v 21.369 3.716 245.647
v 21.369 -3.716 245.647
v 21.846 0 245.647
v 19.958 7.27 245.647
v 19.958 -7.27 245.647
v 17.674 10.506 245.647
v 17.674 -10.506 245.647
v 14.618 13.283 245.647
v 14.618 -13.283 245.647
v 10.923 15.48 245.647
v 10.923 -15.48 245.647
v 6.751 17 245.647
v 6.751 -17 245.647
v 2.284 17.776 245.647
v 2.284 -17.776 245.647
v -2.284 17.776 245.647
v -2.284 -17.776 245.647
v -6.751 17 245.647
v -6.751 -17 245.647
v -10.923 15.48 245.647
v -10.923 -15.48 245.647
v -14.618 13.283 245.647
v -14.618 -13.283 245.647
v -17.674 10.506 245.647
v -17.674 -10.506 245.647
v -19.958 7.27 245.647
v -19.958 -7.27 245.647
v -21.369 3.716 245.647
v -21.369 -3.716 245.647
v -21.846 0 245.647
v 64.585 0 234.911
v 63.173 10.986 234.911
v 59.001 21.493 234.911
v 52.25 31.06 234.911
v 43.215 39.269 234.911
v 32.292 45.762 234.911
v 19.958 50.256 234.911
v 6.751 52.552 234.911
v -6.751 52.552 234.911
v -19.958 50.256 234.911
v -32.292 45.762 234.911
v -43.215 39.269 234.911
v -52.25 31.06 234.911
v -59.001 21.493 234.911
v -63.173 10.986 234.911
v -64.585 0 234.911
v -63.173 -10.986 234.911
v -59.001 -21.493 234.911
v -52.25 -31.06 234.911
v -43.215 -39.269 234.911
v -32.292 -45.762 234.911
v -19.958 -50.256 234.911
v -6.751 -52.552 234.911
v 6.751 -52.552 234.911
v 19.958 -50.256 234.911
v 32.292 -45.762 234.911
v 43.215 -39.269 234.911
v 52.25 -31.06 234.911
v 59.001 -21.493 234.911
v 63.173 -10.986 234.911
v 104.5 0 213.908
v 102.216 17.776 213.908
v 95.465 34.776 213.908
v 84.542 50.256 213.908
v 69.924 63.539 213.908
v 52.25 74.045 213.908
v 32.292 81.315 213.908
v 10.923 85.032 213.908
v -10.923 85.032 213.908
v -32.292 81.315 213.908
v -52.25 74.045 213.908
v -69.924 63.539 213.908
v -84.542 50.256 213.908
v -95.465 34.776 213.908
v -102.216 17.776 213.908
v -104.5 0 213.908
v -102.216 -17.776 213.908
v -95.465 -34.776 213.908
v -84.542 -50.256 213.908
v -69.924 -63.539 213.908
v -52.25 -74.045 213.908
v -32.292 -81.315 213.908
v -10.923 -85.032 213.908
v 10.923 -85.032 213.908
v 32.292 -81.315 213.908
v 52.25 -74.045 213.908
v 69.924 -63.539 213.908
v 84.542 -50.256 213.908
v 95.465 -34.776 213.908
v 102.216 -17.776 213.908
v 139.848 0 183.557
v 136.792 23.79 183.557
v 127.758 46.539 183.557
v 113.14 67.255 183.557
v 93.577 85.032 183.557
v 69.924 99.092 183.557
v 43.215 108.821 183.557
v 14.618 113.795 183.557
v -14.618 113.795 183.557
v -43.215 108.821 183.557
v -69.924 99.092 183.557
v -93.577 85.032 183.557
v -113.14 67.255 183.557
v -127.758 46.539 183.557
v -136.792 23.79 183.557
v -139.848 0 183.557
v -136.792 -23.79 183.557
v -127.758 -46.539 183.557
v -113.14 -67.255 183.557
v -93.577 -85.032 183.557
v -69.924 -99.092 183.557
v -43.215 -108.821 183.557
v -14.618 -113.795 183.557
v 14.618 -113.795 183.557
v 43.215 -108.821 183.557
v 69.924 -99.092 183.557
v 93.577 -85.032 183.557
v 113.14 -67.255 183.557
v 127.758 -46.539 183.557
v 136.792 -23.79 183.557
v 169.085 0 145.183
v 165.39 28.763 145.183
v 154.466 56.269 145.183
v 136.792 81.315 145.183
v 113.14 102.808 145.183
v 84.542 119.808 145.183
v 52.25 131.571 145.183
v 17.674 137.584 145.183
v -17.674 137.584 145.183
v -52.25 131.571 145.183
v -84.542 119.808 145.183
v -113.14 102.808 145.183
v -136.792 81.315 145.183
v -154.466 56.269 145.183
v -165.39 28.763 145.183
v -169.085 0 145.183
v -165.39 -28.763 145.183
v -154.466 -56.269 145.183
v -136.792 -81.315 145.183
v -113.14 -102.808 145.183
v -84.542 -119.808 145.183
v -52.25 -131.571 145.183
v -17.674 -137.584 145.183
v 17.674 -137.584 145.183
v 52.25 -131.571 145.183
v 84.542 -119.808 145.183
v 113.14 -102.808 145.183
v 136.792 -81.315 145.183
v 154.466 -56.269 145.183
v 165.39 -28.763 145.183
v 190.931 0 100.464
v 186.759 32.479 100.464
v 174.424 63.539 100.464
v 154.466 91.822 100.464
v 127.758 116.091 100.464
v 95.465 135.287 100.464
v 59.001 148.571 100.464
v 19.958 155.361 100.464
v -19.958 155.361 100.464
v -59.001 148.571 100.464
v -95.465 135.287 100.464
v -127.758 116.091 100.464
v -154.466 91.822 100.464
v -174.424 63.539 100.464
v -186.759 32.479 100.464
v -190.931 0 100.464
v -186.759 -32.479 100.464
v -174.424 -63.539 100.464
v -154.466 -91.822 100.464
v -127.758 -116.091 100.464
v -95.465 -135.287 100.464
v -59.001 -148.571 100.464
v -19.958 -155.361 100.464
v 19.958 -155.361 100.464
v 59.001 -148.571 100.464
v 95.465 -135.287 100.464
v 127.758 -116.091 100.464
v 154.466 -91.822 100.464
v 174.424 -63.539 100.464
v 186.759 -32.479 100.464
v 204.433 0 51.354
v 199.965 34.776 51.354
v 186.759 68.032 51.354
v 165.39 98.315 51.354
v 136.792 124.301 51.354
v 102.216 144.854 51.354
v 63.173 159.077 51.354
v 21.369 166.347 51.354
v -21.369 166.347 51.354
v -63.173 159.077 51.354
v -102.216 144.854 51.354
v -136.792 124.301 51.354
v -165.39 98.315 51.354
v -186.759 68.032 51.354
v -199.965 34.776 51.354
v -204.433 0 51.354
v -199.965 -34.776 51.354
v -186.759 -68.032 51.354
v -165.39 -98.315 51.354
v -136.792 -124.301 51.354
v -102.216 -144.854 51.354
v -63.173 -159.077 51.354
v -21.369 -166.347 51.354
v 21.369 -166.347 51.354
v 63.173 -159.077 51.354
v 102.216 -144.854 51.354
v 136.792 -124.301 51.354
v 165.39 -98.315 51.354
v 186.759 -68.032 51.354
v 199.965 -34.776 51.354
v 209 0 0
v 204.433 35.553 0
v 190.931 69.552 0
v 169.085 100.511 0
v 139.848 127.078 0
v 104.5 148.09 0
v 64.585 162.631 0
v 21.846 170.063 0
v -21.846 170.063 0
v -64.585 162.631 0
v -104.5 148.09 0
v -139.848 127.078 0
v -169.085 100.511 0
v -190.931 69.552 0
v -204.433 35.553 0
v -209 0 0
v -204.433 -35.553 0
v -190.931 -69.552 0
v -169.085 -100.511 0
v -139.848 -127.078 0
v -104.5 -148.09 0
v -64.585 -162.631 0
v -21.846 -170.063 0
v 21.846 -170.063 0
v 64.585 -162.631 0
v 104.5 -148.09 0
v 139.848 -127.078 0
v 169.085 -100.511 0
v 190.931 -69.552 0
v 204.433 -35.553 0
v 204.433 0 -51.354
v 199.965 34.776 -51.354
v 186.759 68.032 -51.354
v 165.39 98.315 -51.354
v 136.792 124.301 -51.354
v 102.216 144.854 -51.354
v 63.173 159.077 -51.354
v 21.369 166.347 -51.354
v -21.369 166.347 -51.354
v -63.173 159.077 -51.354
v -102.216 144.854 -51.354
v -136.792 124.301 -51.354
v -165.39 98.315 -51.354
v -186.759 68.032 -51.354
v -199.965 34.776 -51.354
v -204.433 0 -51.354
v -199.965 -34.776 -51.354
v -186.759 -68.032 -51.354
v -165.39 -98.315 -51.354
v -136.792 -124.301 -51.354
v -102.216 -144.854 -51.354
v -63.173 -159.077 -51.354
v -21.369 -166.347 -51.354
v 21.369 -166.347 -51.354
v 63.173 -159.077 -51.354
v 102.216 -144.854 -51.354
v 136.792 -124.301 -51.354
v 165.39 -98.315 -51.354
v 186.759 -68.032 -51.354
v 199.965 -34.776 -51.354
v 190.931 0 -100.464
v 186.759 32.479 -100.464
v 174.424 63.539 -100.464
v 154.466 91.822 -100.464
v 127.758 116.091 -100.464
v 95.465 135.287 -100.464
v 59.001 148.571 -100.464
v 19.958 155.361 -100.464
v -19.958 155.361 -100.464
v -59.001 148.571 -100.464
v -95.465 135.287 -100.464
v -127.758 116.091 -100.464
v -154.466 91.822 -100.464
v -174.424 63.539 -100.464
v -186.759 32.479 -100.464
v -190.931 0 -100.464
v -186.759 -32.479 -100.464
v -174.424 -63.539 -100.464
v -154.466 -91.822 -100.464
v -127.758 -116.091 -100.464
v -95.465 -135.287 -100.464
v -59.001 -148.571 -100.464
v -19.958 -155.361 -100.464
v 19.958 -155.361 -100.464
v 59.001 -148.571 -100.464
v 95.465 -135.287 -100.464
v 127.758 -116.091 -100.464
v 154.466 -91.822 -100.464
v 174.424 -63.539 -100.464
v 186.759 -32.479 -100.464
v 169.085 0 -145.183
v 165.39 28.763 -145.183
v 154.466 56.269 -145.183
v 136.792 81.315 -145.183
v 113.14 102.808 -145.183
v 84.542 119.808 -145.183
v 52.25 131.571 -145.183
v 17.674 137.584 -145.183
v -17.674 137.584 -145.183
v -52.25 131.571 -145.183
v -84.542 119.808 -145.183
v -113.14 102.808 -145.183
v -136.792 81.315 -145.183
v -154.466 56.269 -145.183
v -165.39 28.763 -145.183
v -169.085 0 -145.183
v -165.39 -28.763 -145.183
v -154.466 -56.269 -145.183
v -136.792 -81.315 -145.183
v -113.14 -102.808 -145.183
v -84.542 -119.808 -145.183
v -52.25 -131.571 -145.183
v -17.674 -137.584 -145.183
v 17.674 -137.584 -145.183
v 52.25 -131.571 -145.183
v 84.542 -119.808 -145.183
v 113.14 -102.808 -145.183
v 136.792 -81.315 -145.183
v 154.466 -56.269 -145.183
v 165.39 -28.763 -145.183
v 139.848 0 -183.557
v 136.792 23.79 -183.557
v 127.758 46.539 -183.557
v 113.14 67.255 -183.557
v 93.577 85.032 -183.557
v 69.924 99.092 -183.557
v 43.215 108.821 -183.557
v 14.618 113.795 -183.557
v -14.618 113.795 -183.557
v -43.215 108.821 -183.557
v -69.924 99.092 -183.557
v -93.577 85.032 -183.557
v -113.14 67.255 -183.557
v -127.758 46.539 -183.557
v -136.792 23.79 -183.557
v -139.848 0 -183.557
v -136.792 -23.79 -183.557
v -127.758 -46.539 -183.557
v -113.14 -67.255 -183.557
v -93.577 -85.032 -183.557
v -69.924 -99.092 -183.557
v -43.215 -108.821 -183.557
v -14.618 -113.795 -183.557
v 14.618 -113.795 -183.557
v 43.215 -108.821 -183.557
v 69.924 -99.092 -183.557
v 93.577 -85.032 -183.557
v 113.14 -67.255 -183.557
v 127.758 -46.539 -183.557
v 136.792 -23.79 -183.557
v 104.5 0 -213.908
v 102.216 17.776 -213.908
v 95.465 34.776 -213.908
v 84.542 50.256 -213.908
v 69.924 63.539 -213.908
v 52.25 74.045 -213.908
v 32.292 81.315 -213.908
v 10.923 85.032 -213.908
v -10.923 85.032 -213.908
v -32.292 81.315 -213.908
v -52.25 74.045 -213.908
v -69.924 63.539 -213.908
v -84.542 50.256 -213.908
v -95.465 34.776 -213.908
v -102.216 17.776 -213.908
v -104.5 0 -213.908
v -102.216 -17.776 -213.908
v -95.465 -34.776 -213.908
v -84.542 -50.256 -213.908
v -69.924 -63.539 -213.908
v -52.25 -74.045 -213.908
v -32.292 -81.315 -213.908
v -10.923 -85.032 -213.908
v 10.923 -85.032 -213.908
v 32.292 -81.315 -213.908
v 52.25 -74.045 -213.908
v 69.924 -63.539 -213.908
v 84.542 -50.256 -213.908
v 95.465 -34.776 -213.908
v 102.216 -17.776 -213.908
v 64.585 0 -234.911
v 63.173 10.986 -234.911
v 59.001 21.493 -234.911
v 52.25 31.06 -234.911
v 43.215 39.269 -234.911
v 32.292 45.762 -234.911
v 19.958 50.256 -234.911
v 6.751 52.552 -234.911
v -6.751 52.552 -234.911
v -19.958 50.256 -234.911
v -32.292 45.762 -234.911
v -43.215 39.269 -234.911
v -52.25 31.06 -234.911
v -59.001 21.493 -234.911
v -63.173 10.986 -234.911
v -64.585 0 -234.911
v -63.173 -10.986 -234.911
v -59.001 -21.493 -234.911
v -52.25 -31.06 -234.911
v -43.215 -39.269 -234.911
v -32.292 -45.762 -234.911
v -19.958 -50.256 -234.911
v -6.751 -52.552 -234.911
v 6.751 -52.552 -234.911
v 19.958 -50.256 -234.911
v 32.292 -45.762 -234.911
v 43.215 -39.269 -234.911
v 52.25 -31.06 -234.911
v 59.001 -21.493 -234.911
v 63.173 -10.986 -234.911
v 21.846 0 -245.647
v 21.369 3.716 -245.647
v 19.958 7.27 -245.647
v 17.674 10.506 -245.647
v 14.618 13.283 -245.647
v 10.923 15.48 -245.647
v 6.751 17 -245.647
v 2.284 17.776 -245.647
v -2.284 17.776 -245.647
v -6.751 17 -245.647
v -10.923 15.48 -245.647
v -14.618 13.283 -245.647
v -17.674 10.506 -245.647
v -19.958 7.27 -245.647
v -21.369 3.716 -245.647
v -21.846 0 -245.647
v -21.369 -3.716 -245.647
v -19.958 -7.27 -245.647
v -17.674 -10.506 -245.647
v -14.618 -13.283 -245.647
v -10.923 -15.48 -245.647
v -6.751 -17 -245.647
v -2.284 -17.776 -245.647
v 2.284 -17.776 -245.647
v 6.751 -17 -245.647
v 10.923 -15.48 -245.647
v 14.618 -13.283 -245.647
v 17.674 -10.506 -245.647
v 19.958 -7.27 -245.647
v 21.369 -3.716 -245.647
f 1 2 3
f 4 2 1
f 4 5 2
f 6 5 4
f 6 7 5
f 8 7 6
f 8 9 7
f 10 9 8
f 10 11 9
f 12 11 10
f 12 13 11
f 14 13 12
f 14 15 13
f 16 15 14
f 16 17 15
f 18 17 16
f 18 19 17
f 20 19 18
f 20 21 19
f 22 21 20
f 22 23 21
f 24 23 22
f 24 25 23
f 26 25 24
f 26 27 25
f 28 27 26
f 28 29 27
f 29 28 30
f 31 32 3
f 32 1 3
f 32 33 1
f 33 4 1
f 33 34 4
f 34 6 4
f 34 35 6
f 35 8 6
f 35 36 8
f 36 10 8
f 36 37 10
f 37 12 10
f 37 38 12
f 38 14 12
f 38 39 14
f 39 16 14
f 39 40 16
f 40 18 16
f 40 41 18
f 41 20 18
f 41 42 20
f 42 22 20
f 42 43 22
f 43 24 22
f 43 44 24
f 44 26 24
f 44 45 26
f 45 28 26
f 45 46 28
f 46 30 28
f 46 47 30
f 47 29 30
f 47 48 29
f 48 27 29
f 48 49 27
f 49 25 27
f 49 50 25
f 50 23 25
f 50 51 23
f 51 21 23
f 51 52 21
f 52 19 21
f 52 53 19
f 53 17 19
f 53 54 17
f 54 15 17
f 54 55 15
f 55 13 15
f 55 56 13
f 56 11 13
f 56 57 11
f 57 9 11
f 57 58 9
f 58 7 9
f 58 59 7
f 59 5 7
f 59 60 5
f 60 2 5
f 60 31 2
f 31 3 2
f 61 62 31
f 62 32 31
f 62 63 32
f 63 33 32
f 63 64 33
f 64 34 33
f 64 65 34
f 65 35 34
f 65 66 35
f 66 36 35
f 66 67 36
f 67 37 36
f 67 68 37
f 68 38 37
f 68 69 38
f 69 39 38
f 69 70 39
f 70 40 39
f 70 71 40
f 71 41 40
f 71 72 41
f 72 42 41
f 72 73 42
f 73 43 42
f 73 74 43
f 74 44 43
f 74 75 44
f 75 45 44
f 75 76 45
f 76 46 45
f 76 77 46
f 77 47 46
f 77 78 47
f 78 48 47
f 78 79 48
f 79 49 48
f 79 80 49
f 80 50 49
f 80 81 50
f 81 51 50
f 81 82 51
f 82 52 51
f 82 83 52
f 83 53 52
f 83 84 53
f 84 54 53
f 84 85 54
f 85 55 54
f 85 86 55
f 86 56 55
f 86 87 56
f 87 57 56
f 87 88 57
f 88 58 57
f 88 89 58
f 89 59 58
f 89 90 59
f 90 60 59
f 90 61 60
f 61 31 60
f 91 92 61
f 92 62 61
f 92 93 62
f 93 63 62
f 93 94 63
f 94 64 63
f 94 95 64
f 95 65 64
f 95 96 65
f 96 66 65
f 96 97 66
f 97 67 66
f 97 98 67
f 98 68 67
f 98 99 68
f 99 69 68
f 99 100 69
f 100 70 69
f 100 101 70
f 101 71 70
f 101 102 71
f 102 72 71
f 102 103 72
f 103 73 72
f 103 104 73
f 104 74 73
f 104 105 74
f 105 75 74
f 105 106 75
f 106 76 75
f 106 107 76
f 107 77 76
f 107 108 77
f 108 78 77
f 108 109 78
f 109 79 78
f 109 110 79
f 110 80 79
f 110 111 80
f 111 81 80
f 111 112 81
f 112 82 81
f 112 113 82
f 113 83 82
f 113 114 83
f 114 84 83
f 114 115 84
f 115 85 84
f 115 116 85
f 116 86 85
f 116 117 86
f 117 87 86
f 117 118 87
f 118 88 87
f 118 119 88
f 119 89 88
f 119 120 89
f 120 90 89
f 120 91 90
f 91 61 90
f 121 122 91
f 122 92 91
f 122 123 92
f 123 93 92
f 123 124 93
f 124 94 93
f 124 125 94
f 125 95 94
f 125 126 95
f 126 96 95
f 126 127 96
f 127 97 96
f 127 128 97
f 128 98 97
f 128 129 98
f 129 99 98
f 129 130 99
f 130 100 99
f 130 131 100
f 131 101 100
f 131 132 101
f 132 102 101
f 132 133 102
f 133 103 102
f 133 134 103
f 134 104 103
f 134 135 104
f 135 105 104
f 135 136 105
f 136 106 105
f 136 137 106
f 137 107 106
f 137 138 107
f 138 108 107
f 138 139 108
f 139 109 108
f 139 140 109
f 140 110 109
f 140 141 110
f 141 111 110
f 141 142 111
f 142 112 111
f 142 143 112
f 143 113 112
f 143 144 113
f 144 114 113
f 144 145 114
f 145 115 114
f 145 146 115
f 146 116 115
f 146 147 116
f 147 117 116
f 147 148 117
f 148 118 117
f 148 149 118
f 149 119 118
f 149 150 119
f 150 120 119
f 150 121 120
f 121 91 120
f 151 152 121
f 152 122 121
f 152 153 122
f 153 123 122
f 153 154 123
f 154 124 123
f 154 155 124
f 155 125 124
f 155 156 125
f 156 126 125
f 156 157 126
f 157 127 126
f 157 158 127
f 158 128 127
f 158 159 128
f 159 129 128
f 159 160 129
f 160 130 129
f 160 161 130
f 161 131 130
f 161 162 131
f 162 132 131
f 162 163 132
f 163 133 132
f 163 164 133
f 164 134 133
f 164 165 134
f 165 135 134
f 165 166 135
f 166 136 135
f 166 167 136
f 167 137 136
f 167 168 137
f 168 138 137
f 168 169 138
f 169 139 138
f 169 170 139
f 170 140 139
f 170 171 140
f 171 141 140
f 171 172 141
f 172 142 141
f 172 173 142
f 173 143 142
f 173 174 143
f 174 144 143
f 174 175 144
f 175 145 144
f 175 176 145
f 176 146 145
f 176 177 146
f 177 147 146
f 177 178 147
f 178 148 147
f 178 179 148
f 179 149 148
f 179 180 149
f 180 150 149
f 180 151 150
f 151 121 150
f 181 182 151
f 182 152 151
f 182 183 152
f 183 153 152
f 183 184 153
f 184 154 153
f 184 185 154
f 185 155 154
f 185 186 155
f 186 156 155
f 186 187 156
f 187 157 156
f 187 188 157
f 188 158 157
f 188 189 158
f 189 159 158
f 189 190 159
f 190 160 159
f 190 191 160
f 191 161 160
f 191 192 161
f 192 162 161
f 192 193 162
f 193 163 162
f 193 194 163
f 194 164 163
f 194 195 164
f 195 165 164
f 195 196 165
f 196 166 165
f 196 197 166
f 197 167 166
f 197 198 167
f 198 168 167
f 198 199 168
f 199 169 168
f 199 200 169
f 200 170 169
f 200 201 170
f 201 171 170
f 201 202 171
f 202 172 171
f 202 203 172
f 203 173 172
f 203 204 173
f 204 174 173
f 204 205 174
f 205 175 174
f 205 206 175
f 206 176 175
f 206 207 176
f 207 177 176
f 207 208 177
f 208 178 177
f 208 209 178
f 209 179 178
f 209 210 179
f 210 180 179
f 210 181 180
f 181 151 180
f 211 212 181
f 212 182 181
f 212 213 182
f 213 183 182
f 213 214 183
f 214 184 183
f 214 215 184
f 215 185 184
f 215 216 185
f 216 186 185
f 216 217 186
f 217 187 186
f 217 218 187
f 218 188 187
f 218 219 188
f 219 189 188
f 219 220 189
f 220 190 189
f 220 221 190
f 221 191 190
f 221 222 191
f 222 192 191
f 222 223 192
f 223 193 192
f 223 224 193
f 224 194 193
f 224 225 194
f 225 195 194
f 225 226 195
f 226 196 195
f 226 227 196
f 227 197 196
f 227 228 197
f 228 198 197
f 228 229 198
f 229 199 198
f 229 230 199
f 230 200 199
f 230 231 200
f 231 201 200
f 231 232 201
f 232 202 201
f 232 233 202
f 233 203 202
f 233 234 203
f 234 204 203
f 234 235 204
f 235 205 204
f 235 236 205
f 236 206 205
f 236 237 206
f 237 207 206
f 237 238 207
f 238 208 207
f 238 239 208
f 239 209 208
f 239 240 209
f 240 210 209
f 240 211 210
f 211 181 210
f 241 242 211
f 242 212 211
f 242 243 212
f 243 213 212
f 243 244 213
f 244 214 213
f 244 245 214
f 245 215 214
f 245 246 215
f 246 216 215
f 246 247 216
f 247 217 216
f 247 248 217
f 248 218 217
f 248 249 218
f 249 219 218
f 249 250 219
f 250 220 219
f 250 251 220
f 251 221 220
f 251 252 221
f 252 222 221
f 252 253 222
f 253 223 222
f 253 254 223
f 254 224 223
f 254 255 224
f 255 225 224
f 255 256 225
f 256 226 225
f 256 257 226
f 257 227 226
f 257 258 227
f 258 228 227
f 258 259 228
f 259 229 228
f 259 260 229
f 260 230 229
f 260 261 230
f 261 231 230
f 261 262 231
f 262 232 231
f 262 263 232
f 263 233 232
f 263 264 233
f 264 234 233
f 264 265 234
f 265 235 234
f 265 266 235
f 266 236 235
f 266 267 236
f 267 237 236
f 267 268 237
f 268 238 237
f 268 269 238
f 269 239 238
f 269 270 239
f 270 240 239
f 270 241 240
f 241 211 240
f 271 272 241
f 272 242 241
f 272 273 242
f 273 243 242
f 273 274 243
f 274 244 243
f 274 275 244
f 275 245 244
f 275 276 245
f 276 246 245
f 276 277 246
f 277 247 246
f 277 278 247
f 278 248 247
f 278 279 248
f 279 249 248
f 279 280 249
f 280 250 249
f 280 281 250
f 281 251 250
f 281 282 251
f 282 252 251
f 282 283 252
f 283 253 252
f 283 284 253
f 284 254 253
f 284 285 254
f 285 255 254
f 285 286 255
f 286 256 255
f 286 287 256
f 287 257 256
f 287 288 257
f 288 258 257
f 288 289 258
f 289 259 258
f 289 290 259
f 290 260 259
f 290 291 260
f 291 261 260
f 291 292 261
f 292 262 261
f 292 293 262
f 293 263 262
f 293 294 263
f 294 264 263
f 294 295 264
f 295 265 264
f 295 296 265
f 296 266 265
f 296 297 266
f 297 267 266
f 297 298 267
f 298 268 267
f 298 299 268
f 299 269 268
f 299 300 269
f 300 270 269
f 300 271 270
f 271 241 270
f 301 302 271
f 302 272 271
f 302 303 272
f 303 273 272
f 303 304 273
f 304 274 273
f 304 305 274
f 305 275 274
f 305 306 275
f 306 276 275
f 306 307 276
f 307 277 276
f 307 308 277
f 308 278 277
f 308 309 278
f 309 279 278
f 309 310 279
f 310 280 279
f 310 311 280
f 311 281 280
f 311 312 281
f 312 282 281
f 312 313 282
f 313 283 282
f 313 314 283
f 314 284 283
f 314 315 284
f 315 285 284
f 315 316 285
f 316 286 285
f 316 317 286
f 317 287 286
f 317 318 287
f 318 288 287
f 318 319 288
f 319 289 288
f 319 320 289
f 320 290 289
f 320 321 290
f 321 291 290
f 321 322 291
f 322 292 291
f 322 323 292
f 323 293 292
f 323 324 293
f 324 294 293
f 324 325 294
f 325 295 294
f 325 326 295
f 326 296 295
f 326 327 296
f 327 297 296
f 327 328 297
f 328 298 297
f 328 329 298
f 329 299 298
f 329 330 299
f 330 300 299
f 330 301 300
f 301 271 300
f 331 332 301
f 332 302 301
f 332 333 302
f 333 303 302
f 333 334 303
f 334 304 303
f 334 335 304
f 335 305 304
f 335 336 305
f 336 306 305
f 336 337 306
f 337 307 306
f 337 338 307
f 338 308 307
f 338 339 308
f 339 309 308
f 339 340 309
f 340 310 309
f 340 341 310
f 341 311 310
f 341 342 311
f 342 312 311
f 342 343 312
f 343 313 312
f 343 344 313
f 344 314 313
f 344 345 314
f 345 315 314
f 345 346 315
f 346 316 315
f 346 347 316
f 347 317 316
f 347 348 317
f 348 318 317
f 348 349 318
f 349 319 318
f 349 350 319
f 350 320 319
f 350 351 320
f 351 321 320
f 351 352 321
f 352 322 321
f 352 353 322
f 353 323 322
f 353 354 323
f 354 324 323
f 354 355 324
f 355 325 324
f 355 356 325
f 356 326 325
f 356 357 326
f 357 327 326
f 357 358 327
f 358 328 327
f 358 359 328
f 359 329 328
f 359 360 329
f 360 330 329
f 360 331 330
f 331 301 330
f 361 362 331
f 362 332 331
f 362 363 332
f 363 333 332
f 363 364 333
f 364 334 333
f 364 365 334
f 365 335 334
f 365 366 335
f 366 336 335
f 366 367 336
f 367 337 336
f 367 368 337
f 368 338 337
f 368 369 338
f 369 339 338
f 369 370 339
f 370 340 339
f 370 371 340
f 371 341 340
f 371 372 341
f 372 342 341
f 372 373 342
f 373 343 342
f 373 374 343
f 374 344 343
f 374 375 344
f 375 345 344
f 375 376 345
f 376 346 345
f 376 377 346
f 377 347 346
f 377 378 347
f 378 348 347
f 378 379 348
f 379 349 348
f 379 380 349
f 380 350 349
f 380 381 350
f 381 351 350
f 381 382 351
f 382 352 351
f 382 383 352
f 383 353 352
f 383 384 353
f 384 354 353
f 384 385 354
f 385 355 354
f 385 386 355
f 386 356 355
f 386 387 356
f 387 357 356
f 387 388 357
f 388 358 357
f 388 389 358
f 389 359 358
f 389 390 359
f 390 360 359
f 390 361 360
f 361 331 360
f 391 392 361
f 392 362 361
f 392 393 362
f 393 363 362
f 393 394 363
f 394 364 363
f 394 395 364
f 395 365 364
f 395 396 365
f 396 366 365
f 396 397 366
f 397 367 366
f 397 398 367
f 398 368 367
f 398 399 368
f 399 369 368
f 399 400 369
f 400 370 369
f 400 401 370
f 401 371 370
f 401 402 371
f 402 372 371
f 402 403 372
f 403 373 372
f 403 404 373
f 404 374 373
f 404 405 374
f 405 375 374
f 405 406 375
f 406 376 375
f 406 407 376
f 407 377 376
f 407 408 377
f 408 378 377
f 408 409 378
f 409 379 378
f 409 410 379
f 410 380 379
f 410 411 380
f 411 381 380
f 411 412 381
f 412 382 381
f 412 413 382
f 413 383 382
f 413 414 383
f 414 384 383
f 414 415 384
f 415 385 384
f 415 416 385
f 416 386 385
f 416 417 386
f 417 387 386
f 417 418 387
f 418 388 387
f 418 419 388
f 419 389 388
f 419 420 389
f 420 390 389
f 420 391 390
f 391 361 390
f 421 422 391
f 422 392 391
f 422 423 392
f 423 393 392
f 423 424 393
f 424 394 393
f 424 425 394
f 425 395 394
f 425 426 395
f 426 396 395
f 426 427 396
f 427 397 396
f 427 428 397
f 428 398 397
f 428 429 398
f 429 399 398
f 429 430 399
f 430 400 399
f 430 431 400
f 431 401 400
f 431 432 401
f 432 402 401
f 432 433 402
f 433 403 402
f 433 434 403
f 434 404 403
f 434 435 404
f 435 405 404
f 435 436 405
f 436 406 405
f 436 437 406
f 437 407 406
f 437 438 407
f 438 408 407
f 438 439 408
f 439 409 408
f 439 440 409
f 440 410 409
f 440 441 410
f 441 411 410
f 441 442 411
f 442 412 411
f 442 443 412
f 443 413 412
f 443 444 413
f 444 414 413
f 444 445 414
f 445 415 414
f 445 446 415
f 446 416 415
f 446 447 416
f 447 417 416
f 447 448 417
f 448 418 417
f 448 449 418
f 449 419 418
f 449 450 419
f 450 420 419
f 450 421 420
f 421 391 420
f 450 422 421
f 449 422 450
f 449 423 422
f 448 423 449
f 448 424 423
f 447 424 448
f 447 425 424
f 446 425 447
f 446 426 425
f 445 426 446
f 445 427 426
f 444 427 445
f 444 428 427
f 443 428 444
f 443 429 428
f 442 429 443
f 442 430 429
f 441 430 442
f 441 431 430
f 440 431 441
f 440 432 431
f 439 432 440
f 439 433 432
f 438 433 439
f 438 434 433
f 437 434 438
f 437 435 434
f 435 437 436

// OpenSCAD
// Generated by SolidPython 1.0.1 on 2020-07-29 00:46:49


scale(v = [11, 9, 13]) {
	sphere(r = 19);
}
/***********************************************
*********      SolidPython code:      **********
************************************************
 
# import packages: SolidPython
from solid import *
from solid.utils import *
from itertools import chain, combinations, permutations


class Resize:

    def __init__(self, scad_file):
        self.scad_file = scad_file
        #self.scad_file = import_scad(scad_file)
        # cone/cylinder param:
        self.r1 = 0
        self.r2 = 0
        self.h = 0
        # rectangular prism param:
        self.w = 0
        self.l = 0
        # ellipse param:
        self.r = 0

    # import OpenScad code (file name corresponds to shape)


    # classify shape + parameters
    def assign(self, param1, param2, param3):
        if self.scad_file == 'cone.scad':
            self.r1 = param1
            self.r2 = param2
            self.h = param3
        elif self.scad_file == 'cylinder.scad':
            self.r1 = param1
            self.r2 = param2
            self.h = param3
        elif self.scad_file == 'rectangularPrism.scad':
            self.h = param1
            self.l = param2
            self.w = param3
        else:
            self.r = param1
            self.h = param2

    # resize parameters
    def iterate(self):
        x = range(3, 20, 2)
        i = 1
        if self.scad_file == 'cone.scad':
            tempList = list(permutations(x, 2))
            for temp in tempList:
                param1 = temp[0]
                param2 = temp[1]
                filepath = 'produced_scad_files/' + 'cone' + str(param1) + '_' + str(param2) + '_' + '.scad'
                scad_render_to_file(cylinder(h=param1, r1=param2, r2=0), filepath)

        elif self.scad_file == 'cylinder.scad':
            tempList = list(permutations(x, 3))
            for temp in tempList:
                param1 = temp[0]
                param2 = temp[1]
                filepath = 'produced_scad_files/' + 'cylinder' + str(param1) + '_' + str(param2) + '_' + '.scad'
                scad_render_to_file(cylinder(h=param1, r1=param2, r2=param2), filepath)

        elif self.scad_file == 'rectangularPrism.scad':
            tempList = list(permutations(x, 3))
            for temp in tempList:
                param1 = temp[0]
                param2 = temp[1]
                param3 = temp[2]
                filepath = 'produced_scad_files/' + 'rectangularPrism' + str(param1) + '_' + str(param2) + '_' + str(
                    param3) + '.scad'
                scad_render_to_file(cube(size=(param1, param2, param3)), filepath)

        elif self.scad_file == 'ellipse.scad':
            tempList = list(permutations(x, 4))
            for temp in tempList:
                param1 = temp[0]
                param2 = temp[1]
                param3 = temp[2]
                param4 = temp[3]
                filepath = 'produced_scad_files/' + 'ellipse' + str(param1) + '_' + str(param2) + '_' + str(param3) + '_' + str(param4) + '.scad'
                scad_render_to_file(scale([param1, param2, param3])(sphere(r=param4)), filepath)

    def render_to_scadfile(self):
        scad_render_to_file(scad, 'example.scad') 
 
************************************************/
